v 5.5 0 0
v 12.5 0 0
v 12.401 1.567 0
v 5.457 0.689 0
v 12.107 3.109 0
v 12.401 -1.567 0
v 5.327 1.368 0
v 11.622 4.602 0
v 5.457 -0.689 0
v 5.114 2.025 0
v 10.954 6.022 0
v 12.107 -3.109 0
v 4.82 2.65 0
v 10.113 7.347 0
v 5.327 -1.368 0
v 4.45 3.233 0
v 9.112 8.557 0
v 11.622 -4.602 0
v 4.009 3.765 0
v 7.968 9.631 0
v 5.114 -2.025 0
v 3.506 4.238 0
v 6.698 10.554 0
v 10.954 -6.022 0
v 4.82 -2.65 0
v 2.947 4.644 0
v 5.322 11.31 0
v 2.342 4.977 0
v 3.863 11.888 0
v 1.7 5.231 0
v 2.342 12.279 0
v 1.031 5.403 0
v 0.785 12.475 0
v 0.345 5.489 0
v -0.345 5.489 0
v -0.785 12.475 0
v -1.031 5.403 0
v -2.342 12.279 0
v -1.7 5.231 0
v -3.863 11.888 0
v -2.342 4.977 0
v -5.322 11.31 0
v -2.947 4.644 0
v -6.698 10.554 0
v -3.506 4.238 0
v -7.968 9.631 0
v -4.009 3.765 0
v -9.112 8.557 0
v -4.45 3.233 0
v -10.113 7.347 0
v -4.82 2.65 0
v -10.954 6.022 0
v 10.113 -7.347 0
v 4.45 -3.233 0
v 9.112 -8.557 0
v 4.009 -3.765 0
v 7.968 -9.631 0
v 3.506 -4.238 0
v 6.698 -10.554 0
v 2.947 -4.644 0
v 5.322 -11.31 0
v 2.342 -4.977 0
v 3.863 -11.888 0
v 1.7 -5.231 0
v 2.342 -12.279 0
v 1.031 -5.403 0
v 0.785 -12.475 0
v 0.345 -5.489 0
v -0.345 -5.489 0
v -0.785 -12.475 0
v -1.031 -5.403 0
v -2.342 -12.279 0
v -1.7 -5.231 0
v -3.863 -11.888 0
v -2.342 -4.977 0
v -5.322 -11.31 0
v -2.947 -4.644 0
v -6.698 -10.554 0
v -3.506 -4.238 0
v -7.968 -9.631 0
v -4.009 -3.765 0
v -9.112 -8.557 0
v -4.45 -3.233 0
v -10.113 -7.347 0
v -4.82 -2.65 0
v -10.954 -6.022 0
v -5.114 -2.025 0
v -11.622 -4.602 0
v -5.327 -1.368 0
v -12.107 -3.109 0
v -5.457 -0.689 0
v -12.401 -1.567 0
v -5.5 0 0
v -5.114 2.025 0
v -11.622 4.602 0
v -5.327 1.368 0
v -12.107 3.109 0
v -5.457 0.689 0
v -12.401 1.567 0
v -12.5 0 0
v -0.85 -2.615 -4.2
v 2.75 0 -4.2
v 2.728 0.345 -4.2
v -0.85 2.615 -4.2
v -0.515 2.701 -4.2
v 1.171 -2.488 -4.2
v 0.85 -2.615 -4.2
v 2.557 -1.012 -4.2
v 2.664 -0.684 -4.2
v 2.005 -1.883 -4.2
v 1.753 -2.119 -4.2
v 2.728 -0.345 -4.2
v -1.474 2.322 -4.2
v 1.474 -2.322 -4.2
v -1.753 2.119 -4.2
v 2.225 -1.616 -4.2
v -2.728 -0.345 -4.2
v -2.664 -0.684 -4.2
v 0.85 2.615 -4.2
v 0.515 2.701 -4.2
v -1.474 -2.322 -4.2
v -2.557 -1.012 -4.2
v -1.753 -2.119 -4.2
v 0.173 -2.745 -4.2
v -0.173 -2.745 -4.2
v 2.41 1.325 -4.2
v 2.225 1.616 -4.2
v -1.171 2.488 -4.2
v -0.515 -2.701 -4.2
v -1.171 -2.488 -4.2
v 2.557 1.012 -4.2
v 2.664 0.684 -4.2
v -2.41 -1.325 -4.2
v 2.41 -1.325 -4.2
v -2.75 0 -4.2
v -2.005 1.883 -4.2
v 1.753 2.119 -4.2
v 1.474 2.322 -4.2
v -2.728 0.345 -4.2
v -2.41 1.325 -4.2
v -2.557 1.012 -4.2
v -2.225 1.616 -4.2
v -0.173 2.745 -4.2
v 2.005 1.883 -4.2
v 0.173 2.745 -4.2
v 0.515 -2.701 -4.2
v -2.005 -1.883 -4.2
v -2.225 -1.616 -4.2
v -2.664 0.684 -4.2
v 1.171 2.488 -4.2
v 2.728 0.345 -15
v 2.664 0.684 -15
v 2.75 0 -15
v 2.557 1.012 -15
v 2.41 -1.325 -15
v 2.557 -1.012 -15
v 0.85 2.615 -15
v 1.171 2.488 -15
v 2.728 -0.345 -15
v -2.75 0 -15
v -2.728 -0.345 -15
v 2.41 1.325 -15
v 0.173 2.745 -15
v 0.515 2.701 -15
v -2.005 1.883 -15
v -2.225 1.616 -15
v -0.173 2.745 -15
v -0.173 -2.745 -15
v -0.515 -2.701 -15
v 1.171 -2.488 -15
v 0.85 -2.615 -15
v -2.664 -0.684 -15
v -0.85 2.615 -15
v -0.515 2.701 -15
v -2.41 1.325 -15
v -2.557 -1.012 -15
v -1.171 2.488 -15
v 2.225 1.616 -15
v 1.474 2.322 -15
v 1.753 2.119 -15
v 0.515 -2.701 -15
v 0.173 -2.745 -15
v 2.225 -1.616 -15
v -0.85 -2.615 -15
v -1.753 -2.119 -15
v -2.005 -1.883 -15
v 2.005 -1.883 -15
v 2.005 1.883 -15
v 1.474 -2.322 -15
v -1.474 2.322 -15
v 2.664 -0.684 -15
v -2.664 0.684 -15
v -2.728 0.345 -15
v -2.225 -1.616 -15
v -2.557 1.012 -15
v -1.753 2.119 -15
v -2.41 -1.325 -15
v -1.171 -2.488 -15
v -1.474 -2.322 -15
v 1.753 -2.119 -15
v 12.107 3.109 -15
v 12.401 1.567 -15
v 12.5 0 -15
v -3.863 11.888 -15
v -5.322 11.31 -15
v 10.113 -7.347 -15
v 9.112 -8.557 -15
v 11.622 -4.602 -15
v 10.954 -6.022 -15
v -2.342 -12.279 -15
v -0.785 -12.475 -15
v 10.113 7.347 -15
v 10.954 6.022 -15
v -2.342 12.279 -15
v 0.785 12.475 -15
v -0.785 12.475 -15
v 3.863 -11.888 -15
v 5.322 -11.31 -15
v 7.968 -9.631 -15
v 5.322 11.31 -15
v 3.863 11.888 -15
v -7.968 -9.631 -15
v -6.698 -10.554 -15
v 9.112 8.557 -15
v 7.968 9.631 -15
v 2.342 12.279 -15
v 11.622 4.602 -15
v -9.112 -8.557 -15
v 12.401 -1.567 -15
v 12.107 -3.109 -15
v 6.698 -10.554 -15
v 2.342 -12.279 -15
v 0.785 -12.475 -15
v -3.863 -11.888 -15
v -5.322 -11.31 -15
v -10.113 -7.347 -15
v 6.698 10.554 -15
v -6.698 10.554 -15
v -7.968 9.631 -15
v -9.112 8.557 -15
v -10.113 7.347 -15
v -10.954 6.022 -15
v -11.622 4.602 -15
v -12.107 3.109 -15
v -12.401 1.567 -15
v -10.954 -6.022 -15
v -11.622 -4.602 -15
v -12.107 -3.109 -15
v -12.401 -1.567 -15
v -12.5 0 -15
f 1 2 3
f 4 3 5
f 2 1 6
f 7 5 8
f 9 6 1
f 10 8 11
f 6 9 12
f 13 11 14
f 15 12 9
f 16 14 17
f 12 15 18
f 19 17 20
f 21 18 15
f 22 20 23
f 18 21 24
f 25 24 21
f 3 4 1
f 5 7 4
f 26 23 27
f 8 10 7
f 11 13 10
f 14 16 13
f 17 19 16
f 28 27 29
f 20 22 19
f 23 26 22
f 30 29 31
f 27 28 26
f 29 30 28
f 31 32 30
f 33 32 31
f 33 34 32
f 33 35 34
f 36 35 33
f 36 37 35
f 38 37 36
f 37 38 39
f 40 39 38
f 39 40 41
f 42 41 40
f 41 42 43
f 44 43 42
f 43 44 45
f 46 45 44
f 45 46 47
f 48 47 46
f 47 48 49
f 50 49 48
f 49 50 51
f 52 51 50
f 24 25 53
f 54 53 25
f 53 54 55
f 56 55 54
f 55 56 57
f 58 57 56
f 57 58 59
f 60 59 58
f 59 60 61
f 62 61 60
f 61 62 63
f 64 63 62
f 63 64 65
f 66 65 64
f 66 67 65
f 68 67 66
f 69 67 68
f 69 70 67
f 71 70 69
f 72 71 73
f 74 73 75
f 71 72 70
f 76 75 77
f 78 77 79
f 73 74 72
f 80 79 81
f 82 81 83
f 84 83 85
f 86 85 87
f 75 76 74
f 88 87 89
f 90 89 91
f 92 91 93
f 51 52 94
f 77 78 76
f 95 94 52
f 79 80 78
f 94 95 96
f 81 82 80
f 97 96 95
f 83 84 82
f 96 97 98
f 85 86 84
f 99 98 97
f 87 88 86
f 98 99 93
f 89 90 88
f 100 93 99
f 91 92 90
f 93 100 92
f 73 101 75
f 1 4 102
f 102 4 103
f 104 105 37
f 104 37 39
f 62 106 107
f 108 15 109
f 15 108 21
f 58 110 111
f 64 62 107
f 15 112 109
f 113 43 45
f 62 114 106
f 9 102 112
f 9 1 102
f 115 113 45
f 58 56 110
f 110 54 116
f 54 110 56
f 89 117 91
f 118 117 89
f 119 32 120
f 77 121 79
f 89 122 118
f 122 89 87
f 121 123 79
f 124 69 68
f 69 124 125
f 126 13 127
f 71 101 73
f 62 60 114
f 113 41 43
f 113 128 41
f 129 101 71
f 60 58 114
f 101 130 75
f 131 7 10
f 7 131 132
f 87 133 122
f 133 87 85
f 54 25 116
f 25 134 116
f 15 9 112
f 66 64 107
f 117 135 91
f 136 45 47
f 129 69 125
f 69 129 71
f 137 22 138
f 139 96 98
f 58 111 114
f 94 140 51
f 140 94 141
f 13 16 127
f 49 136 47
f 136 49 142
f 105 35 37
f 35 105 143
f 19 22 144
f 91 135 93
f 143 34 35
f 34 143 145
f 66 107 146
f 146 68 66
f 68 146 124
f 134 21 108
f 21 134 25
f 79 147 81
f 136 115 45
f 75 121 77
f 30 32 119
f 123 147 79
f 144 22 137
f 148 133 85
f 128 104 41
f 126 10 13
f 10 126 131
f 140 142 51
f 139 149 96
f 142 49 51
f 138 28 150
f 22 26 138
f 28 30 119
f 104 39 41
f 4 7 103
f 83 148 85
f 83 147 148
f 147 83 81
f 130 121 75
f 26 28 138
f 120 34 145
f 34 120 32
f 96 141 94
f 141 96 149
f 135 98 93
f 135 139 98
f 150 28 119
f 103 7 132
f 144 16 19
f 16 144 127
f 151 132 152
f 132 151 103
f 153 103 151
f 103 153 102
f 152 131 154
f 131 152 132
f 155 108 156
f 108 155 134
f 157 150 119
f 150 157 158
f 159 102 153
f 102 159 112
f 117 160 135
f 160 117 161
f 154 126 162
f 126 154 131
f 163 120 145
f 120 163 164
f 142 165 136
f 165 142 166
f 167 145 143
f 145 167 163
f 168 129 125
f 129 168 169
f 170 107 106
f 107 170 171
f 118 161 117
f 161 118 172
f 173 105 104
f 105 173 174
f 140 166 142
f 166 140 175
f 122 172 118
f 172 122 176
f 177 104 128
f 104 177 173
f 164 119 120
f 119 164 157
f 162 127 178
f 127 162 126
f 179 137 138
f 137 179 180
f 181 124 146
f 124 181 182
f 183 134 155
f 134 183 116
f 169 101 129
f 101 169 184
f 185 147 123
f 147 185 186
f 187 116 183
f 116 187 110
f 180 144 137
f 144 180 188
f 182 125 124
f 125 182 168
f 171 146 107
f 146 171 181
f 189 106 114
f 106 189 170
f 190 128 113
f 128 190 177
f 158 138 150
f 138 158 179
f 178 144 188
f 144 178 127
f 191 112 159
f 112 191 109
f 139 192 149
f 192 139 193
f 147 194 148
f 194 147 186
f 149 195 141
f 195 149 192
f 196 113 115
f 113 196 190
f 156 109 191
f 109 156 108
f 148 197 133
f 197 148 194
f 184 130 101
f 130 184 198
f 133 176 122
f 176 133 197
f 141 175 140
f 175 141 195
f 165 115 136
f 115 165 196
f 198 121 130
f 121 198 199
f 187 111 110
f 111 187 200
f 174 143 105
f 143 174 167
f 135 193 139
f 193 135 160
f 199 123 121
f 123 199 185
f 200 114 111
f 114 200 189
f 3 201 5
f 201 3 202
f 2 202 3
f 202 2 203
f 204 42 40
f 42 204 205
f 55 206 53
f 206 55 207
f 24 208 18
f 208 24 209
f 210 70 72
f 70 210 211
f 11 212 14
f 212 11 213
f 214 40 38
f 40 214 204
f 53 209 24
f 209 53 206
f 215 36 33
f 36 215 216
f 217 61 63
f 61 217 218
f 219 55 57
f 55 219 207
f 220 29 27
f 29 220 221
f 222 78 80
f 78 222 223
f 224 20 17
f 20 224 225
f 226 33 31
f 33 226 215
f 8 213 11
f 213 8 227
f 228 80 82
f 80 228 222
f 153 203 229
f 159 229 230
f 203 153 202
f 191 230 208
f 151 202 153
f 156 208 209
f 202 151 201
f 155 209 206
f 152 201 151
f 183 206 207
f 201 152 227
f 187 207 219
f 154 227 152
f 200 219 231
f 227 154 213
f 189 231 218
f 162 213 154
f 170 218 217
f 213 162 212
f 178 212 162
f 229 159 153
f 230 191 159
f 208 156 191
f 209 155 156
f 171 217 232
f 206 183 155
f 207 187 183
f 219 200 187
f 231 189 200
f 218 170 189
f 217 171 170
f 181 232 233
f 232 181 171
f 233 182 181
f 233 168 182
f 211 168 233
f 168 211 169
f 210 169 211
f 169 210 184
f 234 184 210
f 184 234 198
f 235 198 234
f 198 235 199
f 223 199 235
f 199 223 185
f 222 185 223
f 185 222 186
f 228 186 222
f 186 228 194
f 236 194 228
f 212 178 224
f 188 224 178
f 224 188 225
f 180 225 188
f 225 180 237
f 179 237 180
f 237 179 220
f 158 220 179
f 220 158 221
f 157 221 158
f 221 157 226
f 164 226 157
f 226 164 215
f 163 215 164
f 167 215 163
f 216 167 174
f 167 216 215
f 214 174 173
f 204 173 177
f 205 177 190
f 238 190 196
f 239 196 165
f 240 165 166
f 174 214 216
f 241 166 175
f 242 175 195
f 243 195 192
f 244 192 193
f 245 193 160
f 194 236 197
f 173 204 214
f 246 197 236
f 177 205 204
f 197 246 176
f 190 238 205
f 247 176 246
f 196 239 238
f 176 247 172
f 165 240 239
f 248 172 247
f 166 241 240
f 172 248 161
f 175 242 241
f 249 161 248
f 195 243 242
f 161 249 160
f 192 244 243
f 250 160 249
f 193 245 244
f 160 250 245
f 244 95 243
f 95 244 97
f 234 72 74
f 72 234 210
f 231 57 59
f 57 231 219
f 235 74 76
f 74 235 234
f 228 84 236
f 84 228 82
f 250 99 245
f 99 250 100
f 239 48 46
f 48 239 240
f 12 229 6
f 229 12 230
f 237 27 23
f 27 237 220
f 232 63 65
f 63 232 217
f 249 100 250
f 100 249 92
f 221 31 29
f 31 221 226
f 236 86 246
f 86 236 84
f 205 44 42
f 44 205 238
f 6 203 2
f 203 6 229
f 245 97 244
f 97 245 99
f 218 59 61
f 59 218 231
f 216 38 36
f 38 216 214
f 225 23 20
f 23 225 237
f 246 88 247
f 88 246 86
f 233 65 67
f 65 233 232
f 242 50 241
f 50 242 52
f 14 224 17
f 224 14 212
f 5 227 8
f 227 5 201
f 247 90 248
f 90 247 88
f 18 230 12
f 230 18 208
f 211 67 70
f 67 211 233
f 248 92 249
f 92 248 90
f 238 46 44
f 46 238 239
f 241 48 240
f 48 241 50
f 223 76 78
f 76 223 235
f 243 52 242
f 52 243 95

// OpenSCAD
$fn = 50;


difference() {
	union() {
		translate(v = [0, 0, -15.0000000000]) {
			cylinder(h = 15, r = 12.5000000000);
		}
	}
	union() {
		translate(v = [0, 0, 0]) {
			rotate(a = [0, 0, 0]) {
				difference() {
					union() {
						translate(v = [0, 0, -18.0000000000]) {
							cylinder(h = 18, r = 2.2500000000);
						}
						translate(v = [0, 0, -4.2000000000]) {
							cylinder(h = 4.2000000000, r1 = 2.7500000000, r2 = 5.5000000000);
						}
						translate(v = [0, 0, -18.0000000000]) {
							cylinder(h = 18, r = 2.7500000000);
						}
						translate(v = [0, 0, -18.0000000000]) {
							cylinder(h = 18, r = 2.2500000000);
						}
					}
					union();
				}
			}
		}
	}
}
